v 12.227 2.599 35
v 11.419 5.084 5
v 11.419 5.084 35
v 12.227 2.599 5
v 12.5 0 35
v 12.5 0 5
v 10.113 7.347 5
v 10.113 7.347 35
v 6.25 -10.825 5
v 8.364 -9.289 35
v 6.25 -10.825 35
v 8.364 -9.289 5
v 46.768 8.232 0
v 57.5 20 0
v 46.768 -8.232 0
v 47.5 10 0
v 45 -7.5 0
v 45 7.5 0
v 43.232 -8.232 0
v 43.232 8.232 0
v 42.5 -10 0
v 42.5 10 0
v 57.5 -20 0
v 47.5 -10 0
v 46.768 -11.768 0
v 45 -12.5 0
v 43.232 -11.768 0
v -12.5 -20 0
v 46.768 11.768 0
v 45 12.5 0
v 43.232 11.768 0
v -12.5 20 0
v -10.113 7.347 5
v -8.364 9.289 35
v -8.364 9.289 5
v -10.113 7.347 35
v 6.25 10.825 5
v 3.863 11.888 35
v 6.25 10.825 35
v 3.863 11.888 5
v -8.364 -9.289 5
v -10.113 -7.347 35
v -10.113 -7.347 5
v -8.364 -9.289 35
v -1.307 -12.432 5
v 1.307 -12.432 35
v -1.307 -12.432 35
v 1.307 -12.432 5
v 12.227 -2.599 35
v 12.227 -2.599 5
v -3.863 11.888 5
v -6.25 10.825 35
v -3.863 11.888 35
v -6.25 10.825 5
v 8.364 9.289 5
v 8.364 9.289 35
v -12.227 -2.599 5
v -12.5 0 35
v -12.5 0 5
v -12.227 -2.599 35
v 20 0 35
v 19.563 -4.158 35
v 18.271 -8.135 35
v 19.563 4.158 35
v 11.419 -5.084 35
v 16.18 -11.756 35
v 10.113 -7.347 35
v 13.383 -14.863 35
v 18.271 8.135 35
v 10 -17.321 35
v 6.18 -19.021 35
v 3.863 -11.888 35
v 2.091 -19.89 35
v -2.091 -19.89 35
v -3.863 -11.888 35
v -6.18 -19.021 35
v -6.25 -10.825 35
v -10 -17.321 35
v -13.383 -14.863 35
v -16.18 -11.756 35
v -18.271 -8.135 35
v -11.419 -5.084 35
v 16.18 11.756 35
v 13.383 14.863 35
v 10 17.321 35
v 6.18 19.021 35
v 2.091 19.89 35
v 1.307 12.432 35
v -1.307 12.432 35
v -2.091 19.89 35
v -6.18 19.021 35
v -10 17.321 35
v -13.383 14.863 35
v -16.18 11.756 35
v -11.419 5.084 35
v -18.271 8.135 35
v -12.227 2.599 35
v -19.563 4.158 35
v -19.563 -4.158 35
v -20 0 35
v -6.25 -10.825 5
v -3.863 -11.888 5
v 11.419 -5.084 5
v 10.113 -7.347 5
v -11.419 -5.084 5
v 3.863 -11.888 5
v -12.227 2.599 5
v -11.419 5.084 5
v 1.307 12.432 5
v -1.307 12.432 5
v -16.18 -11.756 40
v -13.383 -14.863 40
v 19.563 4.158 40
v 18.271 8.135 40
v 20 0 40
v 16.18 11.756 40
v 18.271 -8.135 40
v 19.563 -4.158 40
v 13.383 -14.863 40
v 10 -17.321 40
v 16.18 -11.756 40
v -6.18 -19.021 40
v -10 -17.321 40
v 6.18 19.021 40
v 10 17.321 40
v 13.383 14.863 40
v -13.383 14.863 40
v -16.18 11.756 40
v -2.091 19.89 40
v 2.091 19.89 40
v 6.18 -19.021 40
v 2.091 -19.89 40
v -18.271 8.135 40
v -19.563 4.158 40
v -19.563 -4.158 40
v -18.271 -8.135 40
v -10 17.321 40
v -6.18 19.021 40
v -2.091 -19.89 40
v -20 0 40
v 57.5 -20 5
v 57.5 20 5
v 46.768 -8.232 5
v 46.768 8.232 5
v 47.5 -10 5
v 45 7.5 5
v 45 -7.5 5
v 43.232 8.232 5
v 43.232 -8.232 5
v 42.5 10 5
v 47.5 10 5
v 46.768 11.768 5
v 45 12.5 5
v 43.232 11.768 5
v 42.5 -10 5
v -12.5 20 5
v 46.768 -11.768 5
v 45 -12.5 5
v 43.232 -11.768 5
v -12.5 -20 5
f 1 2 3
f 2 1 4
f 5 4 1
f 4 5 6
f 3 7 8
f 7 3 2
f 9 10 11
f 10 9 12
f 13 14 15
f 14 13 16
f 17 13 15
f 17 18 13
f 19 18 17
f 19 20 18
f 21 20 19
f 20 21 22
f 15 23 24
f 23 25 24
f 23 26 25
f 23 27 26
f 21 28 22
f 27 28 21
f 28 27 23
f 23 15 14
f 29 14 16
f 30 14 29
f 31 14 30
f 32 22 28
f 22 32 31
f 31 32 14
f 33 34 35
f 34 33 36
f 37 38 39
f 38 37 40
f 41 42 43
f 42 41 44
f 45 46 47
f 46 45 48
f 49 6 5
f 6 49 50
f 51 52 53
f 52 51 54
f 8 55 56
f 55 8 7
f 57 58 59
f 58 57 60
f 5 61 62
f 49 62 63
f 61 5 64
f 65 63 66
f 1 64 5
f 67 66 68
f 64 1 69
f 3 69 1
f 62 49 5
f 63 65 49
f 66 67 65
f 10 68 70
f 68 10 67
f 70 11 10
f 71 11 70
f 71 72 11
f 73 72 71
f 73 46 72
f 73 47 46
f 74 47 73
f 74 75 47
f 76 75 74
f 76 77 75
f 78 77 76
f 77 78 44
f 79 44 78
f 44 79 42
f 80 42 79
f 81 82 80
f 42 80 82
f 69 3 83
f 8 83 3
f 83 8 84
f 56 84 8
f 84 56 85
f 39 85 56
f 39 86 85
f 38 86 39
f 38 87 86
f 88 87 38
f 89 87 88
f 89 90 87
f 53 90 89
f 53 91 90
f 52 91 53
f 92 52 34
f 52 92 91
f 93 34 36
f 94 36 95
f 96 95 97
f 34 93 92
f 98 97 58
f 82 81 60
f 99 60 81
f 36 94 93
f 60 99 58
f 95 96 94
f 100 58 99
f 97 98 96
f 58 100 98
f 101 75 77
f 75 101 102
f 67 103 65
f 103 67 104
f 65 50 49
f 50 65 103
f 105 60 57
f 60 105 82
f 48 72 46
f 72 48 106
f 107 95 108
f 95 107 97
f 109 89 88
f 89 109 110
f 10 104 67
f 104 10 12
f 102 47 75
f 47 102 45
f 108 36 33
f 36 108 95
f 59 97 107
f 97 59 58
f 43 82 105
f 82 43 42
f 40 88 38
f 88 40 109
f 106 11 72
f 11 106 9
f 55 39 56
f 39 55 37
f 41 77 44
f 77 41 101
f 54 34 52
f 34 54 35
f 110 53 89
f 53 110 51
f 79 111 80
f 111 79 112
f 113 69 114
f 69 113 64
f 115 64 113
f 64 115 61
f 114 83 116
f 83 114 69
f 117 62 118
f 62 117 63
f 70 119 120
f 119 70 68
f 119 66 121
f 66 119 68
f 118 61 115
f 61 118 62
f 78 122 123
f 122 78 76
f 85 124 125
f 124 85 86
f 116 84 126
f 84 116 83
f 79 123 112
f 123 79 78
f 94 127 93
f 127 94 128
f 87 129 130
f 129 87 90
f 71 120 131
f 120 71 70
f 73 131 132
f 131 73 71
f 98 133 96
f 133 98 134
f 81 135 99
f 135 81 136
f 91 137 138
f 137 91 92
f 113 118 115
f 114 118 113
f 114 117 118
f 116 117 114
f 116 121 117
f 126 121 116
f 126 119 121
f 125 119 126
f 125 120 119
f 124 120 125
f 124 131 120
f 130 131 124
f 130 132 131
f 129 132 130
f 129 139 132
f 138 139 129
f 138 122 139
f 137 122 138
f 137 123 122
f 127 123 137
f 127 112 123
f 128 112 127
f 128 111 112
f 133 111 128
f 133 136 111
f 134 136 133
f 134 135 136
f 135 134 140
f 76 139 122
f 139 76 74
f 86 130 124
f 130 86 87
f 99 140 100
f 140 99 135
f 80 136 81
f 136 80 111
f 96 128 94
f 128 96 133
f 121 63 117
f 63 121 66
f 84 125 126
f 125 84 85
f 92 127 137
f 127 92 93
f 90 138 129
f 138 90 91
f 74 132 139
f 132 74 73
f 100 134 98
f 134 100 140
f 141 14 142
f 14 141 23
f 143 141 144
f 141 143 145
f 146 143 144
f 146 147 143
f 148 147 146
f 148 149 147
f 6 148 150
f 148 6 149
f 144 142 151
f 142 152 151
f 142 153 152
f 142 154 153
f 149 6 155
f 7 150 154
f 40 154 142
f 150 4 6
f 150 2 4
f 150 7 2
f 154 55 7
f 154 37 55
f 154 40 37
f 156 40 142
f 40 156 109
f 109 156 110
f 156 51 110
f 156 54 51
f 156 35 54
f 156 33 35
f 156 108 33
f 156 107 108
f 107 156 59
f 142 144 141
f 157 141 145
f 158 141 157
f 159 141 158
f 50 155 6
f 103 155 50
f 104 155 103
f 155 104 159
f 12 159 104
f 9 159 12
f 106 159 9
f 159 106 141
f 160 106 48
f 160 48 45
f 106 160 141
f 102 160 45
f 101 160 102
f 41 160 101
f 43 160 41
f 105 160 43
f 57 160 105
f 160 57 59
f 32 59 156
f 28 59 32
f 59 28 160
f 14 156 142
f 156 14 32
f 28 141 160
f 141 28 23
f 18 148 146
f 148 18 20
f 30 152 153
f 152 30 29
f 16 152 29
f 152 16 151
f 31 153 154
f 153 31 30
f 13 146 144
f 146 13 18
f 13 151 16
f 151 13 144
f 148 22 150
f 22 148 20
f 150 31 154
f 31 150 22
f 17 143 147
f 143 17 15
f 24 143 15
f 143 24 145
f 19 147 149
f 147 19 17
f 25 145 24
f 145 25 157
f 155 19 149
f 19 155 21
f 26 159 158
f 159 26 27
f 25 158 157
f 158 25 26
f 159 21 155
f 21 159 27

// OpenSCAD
difference()
{
  union()
  {
    cylinder(h=35,d=25);
    translate([0,0,35]) cylinder(h=5,d=40);
    translate([-12.5,-20,0]) cube([70,40,5]);
  }
translate([45,10,-5]) cylinder(h=15,d=5);
translate([45,-10,-5]) cylinder(h=15,d=5);
}
